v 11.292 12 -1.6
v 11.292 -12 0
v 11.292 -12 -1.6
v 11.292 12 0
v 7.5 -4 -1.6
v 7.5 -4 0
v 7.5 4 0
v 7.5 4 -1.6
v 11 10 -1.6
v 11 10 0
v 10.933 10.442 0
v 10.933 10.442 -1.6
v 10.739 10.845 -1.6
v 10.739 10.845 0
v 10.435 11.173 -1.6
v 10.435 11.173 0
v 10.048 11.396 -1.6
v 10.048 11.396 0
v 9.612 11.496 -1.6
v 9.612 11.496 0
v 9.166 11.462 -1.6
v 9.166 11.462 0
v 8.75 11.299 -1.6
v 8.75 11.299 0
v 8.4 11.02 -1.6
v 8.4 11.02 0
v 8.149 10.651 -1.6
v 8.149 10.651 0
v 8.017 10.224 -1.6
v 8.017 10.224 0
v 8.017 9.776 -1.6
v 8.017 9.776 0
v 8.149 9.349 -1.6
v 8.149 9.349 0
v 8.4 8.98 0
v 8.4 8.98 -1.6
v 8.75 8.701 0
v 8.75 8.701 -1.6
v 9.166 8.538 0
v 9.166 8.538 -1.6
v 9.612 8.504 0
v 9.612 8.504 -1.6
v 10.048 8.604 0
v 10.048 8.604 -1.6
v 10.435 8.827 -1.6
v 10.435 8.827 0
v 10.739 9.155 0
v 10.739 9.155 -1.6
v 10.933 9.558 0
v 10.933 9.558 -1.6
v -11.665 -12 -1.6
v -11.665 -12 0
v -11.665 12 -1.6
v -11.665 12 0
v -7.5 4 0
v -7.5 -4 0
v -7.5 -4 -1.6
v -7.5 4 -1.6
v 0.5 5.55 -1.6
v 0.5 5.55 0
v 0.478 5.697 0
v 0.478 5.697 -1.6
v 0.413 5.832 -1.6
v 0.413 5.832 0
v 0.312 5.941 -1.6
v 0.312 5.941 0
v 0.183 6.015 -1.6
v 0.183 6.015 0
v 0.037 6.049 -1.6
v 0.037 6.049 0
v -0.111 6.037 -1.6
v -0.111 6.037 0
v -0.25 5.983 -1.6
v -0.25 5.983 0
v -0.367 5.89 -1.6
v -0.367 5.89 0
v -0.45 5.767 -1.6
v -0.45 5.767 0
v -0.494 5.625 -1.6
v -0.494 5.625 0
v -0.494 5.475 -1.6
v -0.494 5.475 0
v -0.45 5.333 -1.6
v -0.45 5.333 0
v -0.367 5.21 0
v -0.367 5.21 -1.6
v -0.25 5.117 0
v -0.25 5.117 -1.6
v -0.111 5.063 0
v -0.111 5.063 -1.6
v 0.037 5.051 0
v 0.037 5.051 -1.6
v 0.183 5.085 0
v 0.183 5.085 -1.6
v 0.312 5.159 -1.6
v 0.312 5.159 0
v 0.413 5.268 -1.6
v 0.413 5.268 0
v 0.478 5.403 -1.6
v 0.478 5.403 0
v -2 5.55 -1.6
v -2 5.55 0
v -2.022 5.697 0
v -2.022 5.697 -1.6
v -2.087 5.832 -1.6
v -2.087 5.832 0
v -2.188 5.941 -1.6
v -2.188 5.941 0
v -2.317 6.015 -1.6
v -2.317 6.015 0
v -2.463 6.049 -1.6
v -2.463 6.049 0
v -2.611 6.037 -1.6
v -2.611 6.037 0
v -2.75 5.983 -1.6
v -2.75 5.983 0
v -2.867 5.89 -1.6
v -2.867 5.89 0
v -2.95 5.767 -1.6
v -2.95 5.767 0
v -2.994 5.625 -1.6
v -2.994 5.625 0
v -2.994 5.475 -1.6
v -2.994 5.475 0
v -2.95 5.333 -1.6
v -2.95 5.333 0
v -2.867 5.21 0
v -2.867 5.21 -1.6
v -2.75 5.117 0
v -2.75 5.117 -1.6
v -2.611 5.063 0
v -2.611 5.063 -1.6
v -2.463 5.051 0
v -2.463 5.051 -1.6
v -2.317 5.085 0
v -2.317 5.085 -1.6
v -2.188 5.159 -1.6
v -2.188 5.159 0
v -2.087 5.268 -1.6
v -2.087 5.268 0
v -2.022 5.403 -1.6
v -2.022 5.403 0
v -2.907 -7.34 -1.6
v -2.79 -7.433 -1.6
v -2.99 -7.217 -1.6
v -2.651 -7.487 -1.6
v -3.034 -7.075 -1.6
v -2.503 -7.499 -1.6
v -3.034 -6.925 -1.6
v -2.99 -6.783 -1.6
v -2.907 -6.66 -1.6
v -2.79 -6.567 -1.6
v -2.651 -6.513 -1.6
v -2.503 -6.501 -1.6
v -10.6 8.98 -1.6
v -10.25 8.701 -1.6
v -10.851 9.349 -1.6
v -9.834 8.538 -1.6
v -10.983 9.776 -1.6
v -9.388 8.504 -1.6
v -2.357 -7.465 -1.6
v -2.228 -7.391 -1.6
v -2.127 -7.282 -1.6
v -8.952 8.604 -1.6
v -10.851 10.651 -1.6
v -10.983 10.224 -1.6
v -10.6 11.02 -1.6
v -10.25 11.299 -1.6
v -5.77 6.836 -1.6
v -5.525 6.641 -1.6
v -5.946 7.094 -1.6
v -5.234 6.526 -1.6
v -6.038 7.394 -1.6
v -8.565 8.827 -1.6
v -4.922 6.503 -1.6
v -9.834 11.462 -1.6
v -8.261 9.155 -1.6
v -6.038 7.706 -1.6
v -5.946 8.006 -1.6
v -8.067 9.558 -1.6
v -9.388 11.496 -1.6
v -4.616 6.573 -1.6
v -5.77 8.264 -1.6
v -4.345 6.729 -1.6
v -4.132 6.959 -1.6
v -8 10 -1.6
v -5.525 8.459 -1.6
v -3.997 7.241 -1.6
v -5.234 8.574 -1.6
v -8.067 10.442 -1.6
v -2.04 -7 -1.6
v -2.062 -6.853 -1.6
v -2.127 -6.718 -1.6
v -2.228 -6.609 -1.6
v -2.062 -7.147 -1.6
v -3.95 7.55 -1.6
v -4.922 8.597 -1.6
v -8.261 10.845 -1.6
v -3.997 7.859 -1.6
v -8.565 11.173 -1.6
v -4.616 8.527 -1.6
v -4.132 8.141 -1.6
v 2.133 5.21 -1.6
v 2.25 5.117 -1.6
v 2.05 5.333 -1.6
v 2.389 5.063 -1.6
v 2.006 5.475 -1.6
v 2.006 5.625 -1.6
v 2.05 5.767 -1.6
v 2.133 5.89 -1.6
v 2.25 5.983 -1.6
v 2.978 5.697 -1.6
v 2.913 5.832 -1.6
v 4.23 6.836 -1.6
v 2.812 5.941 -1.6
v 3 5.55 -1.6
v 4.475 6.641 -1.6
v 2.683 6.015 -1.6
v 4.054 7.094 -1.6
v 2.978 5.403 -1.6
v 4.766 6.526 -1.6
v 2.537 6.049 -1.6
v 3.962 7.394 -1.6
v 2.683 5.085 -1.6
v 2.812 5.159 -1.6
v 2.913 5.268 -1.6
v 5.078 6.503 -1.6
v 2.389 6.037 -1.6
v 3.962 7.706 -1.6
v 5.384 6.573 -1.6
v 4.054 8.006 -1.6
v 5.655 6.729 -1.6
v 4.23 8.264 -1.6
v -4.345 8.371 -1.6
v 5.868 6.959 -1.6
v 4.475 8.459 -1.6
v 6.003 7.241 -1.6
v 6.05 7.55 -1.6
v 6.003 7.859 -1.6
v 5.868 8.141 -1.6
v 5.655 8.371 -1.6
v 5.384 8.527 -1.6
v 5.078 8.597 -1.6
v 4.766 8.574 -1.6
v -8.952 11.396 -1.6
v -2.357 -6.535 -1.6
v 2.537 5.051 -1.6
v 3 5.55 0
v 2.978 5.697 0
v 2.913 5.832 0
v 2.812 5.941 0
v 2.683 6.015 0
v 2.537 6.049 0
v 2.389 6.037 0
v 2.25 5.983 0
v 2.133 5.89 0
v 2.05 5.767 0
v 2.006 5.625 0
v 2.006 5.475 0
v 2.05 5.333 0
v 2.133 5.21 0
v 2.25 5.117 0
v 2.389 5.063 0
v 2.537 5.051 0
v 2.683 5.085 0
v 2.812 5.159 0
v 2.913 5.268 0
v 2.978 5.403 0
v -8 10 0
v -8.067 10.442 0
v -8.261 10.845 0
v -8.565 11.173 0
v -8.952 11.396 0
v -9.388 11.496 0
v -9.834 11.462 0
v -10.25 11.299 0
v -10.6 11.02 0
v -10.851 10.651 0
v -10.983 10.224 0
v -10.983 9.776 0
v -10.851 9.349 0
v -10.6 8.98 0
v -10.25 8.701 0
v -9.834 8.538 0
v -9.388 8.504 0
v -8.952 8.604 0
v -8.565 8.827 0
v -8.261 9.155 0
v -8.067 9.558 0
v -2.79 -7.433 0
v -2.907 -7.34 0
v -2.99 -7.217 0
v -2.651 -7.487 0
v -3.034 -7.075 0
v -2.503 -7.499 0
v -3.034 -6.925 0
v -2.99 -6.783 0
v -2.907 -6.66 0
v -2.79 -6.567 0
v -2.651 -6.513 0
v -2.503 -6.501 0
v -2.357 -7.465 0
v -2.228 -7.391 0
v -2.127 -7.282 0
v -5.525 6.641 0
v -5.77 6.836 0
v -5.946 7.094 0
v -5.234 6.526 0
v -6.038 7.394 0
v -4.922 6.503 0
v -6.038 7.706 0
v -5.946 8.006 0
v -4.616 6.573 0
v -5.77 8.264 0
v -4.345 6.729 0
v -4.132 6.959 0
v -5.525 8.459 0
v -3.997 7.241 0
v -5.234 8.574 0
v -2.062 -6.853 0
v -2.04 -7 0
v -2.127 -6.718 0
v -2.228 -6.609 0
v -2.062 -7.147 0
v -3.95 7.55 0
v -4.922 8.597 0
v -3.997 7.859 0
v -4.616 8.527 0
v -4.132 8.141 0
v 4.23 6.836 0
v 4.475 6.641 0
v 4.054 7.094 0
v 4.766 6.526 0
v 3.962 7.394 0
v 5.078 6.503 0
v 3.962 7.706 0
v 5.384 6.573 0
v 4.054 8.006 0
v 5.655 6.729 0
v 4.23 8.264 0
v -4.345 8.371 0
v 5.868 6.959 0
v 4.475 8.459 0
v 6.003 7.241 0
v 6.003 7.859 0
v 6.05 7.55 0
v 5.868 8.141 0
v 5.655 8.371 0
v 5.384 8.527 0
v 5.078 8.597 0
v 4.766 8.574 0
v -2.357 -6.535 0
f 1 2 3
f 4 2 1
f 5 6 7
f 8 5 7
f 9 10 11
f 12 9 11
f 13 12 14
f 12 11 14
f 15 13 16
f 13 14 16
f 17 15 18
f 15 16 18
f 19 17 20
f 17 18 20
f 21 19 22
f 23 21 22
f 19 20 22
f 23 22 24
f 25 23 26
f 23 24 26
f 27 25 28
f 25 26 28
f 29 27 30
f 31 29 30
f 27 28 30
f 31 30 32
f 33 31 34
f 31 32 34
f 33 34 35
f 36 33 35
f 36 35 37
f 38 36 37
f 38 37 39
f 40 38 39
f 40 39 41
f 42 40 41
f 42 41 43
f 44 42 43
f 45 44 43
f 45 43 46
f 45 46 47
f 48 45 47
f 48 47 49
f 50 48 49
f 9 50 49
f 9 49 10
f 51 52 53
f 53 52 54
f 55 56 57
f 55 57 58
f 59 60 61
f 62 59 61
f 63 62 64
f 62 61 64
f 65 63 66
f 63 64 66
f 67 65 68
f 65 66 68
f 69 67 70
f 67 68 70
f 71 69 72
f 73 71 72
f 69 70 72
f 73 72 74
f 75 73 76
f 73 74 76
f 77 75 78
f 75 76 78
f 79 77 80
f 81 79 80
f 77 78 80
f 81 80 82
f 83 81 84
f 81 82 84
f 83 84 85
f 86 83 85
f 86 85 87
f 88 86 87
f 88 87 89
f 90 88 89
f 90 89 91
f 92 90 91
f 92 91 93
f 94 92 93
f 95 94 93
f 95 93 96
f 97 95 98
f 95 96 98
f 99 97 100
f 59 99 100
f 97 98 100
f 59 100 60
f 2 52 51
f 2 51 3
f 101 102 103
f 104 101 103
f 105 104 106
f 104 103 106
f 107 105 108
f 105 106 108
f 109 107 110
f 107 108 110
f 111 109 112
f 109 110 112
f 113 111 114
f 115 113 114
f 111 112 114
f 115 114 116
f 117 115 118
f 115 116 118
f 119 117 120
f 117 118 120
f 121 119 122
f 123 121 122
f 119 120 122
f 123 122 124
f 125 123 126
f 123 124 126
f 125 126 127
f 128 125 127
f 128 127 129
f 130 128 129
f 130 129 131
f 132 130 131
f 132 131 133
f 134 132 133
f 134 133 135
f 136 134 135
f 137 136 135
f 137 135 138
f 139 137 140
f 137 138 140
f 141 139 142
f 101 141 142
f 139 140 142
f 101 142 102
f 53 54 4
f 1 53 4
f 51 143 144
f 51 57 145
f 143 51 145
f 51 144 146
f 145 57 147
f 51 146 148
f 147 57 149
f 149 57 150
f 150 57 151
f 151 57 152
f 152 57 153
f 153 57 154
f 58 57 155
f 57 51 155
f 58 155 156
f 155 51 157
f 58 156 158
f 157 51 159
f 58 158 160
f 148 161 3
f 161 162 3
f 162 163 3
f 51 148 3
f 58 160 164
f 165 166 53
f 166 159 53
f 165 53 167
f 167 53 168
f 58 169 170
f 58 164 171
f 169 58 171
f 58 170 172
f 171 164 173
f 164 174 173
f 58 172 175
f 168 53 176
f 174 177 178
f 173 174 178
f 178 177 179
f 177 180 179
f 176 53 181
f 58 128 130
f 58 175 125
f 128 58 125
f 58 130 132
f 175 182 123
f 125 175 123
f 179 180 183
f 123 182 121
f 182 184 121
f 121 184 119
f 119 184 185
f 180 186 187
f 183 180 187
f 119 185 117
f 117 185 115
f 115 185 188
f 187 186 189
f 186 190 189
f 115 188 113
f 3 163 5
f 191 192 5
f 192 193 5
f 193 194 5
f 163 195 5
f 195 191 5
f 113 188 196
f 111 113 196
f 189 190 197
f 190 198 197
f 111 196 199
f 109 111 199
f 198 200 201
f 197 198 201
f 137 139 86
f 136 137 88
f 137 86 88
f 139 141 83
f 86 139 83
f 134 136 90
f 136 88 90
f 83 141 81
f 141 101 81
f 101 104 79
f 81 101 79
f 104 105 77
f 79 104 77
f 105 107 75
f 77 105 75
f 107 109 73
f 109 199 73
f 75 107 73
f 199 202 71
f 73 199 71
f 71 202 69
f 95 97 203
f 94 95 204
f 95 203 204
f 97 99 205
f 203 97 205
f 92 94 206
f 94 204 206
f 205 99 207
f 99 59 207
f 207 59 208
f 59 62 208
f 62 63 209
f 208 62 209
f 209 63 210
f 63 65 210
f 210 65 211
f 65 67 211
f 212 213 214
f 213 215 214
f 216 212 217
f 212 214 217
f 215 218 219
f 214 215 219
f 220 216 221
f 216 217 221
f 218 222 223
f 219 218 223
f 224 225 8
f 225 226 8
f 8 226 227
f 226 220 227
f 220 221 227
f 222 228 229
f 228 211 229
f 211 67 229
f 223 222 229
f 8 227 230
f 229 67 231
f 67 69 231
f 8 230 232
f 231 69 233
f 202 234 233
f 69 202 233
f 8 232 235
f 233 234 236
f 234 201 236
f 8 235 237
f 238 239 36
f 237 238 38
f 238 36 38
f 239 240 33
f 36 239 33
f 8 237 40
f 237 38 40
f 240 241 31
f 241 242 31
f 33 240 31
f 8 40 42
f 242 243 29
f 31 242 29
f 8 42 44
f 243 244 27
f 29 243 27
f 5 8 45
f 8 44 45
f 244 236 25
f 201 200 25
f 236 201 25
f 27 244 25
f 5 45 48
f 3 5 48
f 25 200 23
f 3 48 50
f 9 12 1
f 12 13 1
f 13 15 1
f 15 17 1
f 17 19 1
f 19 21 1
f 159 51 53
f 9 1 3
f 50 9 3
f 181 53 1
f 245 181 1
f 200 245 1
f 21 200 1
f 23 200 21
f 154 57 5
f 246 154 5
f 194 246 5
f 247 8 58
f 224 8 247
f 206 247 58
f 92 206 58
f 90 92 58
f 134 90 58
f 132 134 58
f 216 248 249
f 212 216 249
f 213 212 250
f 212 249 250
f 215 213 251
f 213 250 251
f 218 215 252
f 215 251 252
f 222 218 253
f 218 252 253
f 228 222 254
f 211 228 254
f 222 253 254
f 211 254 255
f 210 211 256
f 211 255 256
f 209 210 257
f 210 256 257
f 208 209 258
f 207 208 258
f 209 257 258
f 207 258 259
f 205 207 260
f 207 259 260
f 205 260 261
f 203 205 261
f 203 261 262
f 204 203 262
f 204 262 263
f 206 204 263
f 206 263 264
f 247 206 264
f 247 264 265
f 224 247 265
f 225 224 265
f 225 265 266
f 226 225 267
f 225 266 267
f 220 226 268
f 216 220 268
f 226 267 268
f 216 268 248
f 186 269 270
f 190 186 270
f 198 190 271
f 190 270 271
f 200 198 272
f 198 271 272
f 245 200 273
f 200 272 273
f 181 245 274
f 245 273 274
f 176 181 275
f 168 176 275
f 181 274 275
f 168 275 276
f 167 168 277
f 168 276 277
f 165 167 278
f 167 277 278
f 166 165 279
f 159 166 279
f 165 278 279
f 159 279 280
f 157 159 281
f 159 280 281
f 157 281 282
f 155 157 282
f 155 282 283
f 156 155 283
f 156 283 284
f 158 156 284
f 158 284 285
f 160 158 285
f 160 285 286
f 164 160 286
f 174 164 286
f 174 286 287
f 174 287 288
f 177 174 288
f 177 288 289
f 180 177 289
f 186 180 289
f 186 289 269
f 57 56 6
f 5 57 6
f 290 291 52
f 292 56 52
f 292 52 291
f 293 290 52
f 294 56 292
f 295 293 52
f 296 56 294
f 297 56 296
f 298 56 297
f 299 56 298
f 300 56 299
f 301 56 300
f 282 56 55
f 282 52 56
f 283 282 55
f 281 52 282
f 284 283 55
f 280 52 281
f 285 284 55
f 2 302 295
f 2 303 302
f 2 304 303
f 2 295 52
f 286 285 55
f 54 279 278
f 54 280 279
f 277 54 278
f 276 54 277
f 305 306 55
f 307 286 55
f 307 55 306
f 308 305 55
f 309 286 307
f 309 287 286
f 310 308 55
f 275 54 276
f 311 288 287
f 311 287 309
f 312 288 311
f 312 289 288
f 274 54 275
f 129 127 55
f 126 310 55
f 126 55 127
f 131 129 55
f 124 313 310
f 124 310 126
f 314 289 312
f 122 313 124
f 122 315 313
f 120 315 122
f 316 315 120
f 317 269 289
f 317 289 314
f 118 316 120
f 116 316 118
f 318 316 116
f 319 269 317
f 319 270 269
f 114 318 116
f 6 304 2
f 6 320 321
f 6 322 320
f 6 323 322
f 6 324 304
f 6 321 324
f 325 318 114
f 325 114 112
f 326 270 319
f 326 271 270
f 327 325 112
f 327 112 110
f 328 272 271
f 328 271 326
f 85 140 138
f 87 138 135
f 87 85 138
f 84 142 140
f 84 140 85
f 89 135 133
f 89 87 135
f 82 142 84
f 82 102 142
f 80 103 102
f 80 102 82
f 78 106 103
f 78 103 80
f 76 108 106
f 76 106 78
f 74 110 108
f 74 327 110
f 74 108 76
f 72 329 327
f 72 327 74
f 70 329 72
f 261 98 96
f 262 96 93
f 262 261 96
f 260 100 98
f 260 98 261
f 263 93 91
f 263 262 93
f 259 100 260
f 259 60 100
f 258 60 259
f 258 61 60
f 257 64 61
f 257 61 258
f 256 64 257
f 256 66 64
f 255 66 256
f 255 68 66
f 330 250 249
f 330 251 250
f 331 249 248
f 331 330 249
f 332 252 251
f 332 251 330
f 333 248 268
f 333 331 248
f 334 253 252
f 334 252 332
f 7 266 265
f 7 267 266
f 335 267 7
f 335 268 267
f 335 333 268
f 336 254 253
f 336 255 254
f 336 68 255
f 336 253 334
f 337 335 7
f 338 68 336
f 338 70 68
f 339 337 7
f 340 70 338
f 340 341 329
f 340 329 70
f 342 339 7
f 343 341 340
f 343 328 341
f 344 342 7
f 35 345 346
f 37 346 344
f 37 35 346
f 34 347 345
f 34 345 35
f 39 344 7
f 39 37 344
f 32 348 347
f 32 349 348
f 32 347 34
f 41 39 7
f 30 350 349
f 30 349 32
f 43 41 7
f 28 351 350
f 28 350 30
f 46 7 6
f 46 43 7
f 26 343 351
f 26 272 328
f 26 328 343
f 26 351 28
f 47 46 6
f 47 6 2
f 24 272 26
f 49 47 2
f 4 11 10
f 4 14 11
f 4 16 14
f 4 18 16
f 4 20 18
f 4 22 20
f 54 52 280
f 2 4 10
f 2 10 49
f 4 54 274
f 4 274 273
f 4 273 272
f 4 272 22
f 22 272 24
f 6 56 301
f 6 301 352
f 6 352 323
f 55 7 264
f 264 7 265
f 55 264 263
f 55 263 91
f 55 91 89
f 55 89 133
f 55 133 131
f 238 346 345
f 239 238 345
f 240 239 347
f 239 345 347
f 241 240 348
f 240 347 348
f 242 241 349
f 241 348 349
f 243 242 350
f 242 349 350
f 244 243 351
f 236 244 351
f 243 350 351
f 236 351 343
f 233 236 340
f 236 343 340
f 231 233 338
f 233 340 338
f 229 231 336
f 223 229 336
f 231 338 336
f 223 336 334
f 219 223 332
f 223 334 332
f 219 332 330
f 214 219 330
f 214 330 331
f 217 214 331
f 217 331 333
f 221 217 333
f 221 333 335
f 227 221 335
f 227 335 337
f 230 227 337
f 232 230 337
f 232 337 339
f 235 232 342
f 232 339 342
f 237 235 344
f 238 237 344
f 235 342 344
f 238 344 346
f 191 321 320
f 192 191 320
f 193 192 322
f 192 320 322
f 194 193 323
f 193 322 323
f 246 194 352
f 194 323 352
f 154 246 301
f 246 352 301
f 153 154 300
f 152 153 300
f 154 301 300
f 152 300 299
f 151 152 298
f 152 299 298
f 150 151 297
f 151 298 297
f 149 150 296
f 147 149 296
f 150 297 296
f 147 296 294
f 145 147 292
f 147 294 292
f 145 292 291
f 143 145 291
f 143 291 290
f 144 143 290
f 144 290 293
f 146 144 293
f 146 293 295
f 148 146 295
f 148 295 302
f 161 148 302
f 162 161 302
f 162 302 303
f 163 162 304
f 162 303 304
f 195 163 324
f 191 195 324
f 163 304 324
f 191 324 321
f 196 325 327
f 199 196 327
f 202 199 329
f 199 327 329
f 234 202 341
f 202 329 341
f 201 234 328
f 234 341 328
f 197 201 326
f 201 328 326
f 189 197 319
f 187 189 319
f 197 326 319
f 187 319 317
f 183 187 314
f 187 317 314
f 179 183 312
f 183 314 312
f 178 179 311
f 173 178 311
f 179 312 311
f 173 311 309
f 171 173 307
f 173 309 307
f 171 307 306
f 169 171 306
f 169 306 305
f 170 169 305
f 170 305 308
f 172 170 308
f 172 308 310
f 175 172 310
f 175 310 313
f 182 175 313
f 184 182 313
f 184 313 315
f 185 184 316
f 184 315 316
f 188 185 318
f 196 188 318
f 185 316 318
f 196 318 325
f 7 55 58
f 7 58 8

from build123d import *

# Parameters (mm, degrees)
F0_W     = 22.956962
F0_H     = 24
F0_R     = 0.5
F0_R_2   = 1.05
F1_DEPTH = 1.6
F2_W     = 15
F2_H     = 8
F3_DEPTH = 25
F4_R     = 1.5
F5_DEPTH = 25


with BuildPart() as f1:
    # F0 (on Top) → F1 (new body)
    with BuildSketch(Plane.XY):
        with Locations((-0.186301, 0)):
            Rectangle(F0_W, F0_H)
        with Locations((-2.54, -7)):
            Circle(F0_R, mode=Mode.SUBTRACT)
        with Locations((-2.5, 5.55)):
            Circle(F0_R, mode=Mode.SUBTRACT)
        with Locations((-5, 7.55)):
            Circle(F0_R_2, mode=Mode.SUBTRACT)
        with Locations((0, 5.55)):
            Circle(F0_R, mode=Mode.SUBTRACT)
        with Locations((2.5, 5.55)):
            Circle(F0_R, mode=Mode.SUBTRACT)
        with Locations((5, 7.55)):
            Circle(F0_R_2, mode=Mode.SUBTRACT)
    extrude(amount=-F1_DEPTH)

    # F2 (on face) → F3 (cut)
    with BuildSketch(Plane.XY):
        Rectangle(F2_W, F2_H)
    extrude(amount=-F3_DEPTH, mode=Mode.SUBTRACT)

    # F4 (on face) → F5 (cut)
    with BuildSketch(Plane.XY):
        with Locations((-9.5, 10)):
            Circle(F4_R)
        with Locations((9.5, 10)):
            Circle(F4_R)
    extrude(amount=-F5_DEPTH, mode=Mode.SUBTRACT)


solid = f1.part
